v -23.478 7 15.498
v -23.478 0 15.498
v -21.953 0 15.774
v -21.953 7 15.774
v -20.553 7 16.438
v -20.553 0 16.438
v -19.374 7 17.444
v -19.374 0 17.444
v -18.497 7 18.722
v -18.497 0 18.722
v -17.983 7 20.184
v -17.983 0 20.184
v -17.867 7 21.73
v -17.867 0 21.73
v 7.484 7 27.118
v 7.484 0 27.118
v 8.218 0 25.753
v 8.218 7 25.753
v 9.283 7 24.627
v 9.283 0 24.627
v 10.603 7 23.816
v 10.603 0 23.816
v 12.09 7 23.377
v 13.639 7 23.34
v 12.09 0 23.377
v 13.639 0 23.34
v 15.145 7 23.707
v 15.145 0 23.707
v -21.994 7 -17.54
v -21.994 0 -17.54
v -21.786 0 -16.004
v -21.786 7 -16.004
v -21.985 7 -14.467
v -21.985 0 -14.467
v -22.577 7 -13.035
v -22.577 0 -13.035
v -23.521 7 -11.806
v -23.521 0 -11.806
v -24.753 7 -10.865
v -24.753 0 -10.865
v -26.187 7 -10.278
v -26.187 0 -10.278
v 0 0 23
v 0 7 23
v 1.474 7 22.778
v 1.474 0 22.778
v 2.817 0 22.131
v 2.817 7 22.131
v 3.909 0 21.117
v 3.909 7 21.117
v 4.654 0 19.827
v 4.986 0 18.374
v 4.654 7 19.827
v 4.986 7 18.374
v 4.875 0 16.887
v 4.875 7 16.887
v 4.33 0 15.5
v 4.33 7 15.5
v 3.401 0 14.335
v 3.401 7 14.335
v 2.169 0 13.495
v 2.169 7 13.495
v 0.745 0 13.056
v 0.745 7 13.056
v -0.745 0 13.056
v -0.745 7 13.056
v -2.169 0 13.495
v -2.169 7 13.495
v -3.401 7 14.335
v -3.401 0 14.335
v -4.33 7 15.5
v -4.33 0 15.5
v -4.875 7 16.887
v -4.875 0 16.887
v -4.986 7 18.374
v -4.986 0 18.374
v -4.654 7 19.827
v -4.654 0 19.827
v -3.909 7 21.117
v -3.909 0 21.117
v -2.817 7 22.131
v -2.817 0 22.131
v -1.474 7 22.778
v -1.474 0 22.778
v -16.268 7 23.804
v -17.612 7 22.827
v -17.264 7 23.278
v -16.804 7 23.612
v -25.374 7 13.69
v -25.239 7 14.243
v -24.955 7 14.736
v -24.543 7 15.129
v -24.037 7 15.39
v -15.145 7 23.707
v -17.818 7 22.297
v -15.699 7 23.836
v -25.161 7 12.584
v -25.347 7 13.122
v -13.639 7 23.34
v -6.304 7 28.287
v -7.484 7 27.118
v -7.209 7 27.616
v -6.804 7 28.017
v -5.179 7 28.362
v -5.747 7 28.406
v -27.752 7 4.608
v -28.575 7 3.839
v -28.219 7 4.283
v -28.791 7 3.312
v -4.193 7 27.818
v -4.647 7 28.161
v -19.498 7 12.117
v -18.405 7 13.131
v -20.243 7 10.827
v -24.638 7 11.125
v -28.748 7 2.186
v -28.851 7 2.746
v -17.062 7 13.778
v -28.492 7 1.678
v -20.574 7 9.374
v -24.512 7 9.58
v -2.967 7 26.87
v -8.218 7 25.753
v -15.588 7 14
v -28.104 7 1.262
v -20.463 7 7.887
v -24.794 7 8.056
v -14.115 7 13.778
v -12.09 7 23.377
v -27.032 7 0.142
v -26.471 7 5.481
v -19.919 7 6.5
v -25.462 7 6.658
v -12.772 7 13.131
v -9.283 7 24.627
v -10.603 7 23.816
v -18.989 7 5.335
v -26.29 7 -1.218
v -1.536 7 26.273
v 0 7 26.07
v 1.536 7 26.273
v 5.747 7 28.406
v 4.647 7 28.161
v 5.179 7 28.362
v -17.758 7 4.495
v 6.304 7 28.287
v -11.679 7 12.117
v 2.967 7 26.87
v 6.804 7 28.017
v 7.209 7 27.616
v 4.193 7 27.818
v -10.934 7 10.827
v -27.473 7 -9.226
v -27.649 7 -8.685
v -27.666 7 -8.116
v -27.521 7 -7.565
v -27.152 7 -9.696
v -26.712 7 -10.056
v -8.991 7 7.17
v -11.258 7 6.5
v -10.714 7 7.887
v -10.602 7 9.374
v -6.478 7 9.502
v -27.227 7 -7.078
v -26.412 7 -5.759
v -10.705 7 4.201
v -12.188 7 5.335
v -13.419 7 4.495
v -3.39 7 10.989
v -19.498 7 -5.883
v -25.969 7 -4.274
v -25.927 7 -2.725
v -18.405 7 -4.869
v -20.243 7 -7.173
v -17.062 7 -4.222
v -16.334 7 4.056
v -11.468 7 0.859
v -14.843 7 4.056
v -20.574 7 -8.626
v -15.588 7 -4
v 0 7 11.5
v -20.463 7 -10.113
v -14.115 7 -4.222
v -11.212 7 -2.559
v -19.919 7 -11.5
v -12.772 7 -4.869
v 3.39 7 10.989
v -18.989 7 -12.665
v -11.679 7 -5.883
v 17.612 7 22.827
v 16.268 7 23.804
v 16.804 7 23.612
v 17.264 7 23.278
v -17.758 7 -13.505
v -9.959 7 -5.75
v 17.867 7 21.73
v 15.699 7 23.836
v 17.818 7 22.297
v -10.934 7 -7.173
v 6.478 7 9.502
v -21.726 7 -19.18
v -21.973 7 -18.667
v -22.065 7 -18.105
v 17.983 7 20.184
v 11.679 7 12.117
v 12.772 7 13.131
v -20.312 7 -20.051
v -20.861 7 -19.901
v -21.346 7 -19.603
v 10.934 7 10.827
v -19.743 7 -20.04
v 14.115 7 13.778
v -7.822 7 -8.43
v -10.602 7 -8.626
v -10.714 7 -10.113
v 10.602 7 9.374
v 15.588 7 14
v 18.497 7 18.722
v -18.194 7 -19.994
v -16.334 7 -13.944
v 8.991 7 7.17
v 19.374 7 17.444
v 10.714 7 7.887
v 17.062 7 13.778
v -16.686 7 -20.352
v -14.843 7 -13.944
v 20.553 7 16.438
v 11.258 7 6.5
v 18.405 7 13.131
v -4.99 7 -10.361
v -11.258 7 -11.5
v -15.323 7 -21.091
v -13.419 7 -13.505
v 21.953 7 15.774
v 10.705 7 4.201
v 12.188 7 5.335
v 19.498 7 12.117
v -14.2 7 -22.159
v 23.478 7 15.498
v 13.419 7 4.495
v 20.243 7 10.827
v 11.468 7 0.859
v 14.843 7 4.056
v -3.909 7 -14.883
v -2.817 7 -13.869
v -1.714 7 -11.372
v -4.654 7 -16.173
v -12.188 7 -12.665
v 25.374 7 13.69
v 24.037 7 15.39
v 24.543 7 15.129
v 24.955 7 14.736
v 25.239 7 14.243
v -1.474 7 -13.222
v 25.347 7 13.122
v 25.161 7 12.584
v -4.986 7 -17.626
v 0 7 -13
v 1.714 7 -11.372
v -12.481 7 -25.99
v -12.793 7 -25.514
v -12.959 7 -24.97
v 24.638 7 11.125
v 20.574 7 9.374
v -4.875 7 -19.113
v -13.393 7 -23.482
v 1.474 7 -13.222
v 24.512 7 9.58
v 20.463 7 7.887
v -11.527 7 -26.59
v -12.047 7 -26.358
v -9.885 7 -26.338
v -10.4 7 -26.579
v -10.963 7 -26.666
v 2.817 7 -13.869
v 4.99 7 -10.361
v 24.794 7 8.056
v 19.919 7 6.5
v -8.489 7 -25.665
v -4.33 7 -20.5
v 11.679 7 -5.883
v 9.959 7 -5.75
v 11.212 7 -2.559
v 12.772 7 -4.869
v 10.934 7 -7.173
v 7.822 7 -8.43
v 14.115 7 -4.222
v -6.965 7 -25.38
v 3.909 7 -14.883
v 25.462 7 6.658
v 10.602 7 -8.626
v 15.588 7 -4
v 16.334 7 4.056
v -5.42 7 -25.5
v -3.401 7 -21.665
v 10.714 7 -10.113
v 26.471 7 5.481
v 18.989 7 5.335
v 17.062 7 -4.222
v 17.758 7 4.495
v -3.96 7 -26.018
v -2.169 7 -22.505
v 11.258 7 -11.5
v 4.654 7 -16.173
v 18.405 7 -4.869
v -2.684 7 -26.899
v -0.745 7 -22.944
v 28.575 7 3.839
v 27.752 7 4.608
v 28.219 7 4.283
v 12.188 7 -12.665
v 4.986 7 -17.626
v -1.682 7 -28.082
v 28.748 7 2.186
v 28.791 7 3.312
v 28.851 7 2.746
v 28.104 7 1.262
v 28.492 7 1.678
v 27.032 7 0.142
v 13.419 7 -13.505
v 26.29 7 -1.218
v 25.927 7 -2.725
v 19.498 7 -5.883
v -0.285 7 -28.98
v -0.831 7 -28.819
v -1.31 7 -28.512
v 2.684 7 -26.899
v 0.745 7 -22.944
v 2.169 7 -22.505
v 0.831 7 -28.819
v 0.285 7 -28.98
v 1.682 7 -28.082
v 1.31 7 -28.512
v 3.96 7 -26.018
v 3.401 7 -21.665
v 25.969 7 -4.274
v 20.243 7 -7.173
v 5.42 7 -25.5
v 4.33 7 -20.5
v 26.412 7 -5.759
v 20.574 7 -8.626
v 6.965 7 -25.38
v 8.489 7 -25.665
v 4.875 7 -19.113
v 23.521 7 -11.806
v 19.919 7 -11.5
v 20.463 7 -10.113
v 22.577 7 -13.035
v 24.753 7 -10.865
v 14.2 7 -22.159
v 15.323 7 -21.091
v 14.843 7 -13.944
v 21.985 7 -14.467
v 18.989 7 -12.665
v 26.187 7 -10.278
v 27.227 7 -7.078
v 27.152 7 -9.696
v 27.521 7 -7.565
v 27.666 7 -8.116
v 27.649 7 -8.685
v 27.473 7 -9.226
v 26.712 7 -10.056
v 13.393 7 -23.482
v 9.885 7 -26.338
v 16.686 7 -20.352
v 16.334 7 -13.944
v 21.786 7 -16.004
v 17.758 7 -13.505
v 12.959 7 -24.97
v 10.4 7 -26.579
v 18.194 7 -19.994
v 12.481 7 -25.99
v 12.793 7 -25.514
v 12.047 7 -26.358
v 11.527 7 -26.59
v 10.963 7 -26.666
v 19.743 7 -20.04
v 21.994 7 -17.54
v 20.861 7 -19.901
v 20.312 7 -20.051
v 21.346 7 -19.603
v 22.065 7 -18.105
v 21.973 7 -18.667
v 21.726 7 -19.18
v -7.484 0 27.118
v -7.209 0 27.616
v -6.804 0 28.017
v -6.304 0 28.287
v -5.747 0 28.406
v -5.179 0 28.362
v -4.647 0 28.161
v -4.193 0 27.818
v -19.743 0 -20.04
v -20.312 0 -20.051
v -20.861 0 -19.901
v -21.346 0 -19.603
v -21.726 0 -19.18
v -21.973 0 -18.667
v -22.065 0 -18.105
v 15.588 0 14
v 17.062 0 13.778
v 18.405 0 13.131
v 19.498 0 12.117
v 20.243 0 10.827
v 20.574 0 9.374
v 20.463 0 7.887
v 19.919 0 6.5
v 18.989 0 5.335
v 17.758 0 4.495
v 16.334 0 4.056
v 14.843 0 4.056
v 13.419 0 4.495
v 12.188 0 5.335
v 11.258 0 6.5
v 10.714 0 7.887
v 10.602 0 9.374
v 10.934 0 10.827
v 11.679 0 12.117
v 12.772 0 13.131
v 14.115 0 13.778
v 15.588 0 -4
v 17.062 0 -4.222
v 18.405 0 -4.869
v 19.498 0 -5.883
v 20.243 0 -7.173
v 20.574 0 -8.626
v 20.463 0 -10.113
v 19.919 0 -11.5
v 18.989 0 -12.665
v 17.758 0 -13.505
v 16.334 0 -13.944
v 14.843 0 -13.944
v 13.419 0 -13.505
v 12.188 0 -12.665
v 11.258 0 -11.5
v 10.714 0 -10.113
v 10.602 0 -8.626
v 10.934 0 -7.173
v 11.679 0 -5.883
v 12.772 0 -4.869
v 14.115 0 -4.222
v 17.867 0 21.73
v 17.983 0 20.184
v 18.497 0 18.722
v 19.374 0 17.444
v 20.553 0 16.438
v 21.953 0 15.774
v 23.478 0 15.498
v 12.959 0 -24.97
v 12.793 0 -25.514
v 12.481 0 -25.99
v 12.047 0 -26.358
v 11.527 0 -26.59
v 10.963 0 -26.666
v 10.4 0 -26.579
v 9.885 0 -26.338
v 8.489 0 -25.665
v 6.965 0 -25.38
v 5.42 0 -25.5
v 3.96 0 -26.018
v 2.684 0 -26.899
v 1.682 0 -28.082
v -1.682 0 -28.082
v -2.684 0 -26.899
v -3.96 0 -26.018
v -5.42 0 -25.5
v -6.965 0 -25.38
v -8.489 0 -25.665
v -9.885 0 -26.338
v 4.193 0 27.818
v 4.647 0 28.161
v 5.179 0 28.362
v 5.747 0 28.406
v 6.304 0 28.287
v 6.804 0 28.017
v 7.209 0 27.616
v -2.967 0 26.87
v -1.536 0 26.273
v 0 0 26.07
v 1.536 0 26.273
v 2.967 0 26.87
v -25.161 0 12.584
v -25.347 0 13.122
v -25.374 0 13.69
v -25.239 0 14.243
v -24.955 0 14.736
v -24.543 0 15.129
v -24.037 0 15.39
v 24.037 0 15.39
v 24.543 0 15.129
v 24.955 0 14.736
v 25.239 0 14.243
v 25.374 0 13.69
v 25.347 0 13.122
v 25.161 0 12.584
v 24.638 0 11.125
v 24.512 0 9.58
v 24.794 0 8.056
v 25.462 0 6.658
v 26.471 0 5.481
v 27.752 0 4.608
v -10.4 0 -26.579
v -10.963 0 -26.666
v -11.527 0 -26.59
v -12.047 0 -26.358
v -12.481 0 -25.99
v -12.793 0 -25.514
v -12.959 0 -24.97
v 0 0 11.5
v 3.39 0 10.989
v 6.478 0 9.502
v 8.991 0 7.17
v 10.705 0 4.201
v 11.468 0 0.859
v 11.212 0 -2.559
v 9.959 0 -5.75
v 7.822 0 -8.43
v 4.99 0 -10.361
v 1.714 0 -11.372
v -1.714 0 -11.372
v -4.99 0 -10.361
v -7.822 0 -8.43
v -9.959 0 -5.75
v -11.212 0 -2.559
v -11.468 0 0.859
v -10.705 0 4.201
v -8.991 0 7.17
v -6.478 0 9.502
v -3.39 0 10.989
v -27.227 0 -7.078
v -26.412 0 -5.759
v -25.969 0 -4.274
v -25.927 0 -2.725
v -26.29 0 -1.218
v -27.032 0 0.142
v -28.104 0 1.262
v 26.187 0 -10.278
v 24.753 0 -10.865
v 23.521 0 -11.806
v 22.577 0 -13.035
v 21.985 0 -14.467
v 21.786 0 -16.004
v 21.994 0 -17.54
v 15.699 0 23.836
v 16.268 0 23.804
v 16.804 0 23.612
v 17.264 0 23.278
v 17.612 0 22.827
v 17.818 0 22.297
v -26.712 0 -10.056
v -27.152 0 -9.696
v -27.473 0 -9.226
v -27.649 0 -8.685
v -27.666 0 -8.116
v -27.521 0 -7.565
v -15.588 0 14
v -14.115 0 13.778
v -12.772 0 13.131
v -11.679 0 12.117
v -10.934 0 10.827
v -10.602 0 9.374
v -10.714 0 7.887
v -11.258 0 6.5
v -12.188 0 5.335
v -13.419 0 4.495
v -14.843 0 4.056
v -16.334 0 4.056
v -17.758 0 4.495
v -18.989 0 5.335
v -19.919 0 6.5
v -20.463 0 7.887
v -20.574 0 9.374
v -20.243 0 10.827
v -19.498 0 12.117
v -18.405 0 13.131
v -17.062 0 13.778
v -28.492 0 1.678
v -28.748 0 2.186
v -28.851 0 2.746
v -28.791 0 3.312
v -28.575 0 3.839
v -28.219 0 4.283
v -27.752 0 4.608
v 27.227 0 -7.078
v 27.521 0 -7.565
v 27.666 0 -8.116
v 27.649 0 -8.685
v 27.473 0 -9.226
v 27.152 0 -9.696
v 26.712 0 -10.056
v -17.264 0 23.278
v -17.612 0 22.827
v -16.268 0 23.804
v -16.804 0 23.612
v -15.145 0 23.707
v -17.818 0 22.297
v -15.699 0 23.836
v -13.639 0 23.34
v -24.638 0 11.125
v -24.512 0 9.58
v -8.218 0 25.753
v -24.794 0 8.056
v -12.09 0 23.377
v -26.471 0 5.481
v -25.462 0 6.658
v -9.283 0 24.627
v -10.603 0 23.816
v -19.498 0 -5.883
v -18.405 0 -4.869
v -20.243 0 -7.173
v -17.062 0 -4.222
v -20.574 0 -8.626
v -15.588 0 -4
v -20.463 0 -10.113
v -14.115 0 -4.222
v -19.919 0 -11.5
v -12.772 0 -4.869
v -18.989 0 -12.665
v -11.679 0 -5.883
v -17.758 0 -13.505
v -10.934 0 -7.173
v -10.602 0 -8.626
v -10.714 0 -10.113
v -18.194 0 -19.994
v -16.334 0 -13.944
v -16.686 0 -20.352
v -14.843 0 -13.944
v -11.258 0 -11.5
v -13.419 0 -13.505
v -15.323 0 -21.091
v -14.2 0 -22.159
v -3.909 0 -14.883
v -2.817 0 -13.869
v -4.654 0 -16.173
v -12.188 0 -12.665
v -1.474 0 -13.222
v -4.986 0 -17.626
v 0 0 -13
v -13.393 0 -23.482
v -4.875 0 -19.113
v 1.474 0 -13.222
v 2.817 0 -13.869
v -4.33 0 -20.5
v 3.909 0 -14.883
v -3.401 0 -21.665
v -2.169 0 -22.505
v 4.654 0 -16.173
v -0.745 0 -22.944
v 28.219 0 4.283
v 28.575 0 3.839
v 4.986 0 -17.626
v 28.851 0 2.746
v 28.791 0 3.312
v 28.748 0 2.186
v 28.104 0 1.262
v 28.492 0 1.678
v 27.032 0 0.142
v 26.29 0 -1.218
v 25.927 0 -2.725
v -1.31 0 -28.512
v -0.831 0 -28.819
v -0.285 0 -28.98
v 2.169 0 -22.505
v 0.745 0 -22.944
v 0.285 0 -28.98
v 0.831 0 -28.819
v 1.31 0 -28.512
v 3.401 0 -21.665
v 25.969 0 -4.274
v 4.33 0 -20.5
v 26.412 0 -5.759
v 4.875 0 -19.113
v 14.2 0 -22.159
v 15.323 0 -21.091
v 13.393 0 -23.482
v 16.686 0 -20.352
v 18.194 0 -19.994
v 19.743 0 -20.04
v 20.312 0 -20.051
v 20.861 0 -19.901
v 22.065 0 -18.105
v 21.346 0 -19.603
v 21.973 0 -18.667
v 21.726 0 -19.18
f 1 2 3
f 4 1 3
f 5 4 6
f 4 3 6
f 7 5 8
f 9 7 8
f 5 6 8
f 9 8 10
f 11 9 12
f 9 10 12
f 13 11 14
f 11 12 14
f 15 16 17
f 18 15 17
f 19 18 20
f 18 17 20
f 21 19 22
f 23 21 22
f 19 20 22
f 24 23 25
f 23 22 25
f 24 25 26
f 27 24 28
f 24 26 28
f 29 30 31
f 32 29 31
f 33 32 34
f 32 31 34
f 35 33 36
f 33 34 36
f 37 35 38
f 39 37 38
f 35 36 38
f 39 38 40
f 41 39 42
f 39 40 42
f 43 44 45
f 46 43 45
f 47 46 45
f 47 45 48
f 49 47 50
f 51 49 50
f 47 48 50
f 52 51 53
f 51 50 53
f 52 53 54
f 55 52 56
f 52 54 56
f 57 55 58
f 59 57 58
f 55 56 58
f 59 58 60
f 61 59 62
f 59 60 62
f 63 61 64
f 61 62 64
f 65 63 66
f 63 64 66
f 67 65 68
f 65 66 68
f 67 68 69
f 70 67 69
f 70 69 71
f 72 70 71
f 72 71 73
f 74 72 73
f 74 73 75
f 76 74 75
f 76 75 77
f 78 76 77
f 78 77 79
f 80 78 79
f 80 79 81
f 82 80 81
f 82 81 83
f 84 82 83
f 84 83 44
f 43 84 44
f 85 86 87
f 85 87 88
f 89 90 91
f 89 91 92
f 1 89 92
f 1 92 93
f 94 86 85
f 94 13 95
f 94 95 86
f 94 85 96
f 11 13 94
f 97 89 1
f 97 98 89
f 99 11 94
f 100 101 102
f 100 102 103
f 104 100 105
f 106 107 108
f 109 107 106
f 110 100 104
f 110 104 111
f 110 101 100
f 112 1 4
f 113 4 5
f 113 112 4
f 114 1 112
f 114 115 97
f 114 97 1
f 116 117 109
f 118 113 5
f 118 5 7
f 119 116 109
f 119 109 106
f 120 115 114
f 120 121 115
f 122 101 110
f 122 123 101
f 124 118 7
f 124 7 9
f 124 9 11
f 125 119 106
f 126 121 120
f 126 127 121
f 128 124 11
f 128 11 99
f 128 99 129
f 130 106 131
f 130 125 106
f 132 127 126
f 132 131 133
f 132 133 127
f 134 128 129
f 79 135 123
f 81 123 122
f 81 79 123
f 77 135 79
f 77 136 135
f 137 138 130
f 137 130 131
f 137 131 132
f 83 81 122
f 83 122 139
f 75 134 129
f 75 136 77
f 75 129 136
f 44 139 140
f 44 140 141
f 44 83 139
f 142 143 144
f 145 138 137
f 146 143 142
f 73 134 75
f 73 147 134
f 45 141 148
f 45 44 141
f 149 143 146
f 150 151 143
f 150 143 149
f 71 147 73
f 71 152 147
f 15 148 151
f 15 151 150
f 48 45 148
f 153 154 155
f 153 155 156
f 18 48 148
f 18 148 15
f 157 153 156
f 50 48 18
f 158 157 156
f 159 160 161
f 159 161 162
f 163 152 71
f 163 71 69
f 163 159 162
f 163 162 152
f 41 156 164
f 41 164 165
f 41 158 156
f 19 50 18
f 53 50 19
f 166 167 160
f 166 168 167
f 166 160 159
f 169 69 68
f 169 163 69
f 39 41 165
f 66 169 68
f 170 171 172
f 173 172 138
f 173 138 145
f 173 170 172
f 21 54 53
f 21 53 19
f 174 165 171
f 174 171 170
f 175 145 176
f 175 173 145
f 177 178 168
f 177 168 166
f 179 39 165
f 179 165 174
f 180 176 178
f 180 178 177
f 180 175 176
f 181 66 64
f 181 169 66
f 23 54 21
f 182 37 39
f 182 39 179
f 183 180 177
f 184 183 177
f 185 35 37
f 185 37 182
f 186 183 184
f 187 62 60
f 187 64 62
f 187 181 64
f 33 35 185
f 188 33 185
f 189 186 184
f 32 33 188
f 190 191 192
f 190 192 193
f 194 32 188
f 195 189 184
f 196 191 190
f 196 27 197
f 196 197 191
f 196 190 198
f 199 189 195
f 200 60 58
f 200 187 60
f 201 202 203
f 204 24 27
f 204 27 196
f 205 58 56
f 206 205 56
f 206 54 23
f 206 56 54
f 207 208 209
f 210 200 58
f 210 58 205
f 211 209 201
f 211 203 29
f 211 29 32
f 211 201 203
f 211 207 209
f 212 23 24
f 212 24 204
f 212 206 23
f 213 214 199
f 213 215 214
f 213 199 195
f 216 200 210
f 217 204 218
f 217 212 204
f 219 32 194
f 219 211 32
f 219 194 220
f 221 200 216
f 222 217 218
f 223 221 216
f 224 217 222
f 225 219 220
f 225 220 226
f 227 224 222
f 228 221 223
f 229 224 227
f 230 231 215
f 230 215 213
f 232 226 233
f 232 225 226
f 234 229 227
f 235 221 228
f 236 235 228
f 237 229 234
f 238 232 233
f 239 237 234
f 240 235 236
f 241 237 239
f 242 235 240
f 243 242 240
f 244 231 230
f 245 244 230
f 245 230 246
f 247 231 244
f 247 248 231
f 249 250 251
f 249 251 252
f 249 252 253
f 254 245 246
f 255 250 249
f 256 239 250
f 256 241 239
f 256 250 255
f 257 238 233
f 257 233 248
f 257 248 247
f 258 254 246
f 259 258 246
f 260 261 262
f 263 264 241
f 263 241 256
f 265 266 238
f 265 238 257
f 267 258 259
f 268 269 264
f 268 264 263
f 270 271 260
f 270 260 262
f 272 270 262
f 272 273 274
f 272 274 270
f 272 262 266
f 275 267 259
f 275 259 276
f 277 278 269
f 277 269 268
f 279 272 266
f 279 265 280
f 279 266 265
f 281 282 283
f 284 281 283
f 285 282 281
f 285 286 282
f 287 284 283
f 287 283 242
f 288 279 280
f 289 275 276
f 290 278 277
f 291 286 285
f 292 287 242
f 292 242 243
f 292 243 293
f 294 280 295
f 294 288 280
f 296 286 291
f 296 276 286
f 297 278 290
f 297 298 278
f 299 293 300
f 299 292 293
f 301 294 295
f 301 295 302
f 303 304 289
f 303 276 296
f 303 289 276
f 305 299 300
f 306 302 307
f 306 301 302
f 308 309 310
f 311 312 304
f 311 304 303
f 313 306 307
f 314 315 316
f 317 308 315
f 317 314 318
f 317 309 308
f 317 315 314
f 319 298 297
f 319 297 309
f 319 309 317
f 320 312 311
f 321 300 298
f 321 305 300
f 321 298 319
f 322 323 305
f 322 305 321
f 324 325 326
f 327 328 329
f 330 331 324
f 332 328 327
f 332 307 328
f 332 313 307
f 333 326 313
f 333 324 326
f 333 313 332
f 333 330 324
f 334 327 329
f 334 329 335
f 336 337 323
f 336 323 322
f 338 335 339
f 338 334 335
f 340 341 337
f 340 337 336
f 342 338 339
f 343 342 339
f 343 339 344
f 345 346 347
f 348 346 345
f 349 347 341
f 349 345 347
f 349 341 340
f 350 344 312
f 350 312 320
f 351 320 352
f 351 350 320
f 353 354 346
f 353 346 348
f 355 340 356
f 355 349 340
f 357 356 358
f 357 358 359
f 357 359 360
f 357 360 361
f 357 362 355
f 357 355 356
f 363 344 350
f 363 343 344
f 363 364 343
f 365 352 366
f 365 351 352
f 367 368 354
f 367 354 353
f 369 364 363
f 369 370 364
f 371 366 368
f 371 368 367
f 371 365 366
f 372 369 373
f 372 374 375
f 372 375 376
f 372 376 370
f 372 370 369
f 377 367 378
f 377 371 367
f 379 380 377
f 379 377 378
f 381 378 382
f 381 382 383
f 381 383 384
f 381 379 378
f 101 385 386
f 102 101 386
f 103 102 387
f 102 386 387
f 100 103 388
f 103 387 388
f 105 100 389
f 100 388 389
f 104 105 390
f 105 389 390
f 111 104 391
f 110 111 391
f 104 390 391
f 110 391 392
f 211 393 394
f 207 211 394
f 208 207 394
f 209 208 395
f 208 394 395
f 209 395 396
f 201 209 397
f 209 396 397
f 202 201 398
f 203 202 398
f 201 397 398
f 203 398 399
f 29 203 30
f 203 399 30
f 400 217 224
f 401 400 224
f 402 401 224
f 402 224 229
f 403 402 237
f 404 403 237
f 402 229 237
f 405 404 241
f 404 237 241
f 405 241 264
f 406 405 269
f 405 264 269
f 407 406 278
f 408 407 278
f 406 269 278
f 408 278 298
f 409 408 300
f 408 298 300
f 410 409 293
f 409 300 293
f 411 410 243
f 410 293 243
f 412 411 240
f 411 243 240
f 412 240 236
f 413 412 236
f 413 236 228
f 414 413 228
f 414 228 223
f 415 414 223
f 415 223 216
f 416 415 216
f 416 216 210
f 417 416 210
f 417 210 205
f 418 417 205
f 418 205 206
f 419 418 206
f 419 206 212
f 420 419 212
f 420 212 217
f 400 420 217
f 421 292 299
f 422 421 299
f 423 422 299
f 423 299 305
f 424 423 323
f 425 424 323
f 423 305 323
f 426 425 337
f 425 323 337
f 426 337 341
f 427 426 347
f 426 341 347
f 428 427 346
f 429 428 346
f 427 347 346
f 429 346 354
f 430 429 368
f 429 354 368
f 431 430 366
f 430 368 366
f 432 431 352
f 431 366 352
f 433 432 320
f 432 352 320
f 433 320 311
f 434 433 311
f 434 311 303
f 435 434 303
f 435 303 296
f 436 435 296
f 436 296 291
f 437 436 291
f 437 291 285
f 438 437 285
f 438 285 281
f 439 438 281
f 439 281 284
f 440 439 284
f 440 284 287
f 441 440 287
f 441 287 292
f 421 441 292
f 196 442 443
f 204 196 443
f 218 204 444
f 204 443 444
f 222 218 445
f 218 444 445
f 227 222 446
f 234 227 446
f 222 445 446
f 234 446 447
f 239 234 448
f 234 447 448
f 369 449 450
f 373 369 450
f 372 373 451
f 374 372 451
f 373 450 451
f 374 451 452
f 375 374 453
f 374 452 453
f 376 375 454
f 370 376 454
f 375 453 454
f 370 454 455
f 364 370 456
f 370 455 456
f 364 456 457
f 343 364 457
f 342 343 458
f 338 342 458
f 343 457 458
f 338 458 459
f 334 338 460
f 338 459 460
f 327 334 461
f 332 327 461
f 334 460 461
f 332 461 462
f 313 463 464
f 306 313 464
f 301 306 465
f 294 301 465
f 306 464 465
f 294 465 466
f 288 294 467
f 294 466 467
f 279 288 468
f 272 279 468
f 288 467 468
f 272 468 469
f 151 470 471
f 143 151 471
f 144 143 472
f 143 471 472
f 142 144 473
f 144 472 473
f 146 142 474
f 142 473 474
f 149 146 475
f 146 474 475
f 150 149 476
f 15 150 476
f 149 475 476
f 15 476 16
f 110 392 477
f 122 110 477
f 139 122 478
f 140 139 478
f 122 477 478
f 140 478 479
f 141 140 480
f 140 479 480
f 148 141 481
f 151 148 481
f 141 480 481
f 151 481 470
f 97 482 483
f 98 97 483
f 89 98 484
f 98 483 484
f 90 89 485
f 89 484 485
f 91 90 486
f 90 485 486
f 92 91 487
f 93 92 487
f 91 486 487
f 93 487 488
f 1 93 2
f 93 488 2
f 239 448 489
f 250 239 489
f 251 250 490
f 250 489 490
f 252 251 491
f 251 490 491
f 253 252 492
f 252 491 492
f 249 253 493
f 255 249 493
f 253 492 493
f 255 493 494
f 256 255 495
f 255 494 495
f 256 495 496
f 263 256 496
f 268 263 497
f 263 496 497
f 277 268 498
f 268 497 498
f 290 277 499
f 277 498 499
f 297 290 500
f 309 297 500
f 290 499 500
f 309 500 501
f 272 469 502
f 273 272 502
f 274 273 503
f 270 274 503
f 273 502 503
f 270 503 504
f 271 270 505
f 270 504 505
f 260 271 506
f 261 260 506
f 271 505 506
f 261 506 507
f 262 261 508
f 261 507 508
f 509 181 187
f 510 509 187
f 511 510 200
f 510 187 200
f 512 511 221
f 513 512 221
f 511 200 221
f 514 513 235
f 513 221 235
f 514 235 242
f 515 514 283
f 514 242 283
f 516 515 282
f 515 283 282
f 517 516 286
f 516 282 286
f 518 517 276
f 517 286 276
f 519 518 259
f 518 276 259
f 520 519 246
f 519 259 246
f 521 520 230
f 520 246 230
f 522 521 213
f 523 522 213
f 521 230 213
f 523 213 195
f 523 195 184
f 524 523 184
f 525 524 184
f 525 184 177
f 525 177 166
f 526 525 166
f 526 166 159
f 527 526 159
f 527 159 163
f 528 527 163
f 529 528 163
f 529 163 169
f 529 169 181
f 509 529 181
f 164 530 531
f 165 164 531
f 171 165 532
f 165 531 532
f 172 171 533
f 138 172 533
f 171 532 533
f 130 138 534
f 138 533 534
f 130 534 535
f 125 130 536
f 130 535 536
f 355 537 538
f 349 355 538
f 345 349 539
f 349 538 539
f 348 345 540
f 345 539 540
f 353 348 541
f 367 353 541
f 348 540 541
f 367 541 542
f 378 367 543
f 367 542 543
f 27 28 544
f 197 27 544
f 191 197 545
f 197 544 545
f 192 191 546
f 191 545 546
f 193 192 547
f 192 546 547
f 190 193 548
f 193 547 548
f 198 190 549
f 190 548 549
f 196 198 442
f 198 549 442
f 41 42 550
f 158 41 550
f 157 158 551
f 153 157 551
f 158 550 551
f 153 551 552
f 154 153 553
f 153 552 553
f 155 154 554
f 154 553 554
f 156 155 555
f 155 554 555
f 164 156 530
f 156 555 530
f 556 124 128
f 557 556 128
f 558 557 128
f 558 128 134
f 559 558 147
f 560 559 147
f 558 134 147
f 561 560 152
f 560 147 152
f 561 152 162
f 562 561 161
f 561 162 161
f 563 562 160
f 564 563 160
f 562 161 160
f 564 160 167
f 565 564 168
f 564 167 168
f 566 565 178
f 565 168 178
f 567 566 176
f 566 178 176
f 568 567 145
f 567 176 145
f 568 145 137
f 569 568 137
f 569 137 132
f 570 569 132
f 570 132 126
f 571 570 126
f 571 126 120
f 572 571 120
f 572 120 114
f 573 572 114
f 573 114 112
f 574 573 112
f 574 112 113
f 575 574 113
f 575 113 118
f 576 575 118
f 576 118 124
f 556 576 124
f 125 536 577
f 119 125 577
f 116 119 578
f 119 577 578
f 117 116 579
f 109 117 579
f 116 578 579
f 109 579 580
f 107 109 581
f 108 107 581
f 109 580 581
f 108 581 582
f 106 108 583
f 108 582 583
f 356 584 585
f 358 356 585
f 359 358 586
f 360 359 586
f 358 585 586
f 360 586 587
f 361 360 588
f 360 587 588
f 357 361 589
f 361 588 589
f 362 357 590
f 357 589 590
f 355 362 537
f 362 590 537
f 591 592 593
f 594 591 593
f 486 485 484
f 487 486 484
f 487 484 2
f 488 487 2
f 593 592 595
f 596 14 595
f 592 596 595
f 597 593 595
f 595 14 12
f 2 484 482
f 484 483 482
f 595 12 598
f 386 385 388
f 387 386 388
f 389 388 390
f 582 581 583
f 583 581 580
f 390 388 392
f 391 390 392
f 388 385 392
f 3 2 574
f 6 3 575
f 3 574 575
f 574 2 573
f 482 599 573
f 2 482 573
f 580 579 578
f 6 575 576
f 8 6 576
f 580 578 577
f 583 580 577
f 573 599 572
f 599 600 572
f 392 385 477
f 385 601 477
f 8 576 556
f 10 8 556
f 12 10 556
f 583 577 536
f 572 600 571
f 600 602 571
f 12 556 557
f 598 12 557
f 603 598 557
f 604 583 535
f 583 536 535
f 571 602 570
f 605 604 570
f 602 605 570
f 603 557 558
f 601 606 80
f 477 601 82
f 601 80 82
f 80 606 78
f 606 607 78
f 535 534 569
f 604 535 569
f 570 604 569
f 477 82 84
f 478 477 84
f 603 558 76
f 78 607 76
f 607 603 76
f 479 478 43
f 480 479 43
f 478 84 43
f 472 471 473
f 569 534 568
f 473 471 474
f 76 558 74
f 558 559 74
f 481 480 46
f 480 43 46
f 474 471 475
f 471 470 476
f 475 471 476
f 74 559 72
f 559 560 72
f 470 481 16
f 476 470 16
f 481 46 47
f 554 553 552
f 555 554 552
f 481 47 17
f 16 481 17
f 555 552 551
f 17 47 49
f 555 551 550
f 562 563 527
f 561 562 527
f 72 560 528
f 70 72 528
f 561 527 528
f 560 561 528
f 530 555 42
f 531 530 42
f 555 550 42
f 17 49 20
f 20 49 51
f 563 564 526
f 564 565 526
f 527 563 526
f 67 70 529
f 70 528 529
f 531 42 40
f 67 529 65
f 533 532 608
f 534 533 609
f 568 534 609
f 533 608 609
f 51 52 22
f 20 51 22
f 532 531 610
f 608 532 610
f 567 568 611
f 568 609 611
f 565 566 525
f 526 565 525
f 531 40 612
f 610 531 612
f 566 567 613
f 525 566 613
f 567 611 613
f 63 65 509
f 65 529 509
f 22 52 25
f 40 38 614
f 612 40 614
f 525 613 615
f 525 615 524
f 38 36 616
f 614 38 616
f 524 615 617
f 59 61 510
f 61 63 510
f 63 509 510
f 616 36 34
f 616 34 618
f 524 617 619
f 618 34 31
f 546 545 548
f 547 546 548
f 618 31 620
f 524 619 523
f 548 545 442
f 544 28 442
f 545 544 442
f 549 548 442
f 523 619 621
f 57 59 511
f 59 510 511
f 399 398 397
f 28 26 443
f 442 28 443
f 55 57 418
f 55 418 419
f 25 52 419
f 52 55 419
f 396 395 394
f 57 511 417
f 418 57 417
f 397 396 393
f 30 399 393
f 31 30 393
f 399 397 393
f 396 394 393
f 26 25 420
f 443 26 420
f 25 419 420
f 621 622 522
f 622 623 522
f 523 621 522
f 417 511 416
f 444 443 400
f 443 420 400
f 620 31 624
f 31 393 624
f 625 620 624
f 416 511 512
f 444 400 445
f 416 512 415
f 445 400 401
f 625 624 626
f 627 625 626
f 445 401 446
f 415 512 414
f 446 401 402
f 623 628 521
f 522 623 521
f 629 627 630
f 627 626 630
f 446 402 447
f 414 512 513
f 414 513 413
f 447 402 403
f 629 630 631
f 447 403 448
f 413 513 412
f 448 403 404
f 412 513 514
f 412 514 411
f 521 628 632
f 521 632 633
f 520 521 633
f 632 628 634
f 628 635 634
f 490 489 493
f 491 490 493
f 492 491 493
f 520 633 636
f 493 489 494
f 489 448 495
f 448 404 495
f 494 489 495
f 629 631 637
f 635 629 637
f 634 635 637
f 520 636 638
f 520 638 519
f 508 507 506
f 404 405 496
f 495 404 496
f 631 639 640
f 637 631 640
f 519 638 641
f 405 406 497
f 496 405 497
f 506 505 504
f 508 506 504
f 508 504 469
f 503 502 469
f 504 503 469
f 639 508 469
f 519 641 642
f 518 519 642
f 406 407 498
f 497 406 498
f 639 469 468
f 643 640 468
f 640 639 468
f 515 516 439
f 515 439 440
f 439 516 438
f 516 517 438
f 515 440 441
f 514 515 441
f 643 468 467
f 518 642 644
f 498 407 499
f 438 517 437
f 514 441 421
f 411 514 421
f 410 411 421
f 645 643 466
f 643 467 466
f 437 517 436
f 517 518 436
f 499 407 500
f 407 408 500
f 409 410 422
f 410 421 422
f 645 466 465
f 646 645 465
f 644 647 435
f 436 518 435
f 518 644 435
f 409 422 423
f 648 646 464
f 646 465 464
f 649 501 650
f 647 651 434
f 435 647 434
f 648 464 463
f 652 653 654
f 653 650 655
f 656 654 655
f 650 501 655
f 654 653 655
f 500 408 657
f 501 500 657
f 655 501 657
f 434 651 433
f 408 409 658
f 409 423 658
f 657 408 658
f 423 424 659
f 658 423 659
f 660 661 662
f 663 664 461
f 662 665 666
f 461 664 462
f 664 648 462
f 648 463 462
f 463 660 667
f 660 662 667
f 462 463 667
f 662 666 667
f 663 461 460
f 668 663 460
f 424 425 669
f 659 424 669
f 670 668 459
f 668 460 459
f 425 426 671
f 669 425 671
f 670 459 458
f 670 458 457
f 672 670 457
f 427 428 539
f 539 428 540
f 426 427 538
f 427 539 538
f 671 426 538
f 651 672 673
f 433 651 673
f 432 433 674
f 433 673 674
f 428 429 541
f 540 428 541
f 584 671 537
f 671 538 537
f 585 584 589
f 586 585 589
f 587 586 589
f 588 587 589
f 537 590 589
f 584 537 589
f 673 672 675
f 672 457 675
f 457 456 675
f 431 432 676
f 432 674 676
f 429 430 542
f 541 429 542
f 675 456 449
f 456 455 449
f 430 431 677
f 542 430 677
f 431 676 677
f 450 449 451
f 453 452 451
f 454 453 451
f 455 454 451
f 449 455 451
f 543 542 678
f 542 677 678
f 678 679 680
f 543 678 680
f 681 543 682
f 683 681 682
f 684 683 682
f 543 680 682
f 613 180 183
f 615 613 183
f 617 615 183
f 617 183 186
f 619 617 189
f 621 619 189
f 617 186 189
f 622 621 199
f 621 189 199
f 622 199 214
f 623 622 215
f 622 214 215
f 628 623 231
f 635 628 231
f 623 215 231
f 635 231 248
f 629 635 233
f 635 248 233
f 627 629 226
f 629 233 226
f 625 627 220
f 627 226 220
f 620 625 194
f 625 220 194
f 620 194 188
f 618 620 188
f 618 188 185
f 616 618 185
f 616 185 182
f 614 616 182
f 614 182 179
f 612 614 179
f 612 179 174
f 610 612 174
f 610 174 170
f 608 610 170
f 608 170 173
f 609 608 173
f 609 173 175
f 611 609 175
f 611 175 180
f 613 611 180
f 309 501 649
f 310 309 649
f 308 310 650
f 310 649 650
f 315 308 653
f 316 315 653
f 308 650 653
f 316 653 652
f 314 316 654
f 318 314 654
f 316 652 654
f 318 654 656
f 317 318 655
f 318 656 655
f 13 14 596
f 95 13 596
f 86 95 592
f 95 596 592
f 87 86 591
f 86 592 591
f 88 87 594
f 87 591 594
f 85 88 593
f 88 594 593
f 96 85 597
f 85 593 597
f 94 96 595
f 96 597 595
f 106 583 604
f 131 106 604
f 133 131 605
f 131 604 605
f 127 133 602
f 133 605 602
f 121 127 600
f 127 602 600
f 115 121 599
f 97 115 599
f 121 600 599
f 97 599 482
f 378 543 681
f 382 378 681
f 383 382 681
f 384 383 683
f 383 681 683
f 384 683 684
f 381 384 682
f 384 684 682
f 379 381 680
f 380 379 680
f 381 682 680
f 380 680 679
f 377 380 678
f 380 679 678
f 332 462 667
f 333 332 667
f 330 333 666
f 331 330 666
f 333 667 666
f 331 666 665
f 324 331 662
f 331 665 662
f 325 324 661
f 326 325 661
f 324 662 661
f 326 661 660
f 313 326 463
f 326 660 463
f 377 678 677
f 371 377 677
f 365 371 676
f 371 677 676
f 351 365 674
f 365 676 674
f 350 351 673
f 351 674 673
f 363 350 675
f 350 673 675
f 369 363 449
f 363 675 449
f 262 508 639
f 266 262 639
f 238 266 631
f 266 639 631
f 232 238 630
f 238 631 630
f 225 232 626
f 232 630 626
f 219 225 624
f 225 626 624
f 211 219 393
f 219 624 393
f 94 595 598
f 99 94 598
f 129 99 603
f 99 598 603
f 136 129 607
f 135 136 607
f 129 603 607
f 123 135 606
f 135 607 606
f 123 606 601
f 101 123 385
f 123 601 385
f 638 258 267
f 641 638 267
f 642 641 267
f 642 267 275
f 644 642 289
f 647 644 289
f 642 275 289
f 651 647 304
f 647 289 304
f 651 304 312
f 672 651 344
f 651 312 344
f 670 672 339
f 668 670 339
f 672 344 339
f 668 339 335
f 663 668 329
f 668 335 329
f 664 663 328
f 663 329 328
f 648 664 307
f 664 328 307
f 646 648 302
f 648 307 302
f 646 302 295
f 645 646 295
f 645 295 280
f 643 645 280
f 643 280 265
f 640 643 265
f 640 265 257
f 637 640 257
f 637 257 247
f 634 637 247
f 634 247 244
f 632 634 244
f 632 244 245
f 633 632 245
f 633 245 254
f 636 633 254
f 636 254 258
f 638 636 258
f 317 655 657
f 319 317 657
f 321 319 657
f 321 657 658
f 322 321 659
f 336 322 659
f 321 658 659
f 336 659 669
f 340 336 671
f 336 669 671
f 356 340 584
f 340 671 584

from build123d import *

# Parameters (mm, degrees)
BOSS_EXTRUDE1_DEPTH = 7
SKETCH2_R           = 5
SKETCH2_R_2         = 11.5
CUT_EXTRUDE1_DEPTH  = 42.502327226


with BuildPart() as part:
    # Sketch1 → Boss-Extrude1 (new body)
    with BuildSketch(Plane(origin=(0, 0, 0), x_dir=(1, 0, 0), z_dir=(0, 1, 0))):
        with BuildLine():
            ThreePointArc((1.682317925, 28.081575887), (0, 29), (-1.682317925, 28.081575887))
            ThreePointArc((-1.682317925, 28.081575887), (-5.420186592, 25.49997304), (-9.884932009, 26.33805644))
            ThreePointArc((-9.884932009, 26.33805644), (-11.795362649, 26.492818272), (-12.958679807, 24.969535749))
            ThreePointArc((-12.958679807, 24.969535749), (-15.323360273, 21.090796041), (-19.742987398, 20.040447761))
            ThreePointArc((-19.742987398, 20.040447761), (-21.551199939, 19.404787584), (-21.994368225, 17.540036039))
            ThreePointArc((-21.994368225, 17.540036039), (-22.576985755, 13.034828803), (-26.187300906, 10.277663603))
            ThreePointArc((-26.187300906, 10.277663603), (-27.580638973, 8.961492837), (-27.227030564, 7.077704752))
            ThreePointArc((-27.227030564, 7.077704752), (-25.926845294, 2.725021248), (-28.103592183, -1.262221962))
            ThreePointArc((-28.103592183, -1.262221962), (-28.841134966, -3.031325435), (-27.751891968, -4.608425985))
            ThreePointArc((-27.751891968, -4.608425985), (-24.793717744, -8.055967238), (-25.160517059, -12.583857883))
            ThreePointArc((-25.160517059, -12.583857883), (-25.11473671, -14.5), (-23.478199133, -15.497718004))
            ThreePointArc((-23.478199133, -15.497718004), (-19.373531152, -17.444005802), (-17.866959959, -21.729630455))
            ThreePointArc((-17.866959959, -21.729630455), (-17.045772316, -23.461492837), (-15.144912376, -23.707313787))
            ThreePointArc((-15.144912376, -23.707313787), (-10.603485021, -23.815817289), (-7.484043166, -27.118152514))
            ThreePointArc((-7.484043166, -27.118152514), (-6.029439034, -28.366280421), (-4.192932681, -27.817699643))
            ThreePointArc((-4.192932681, -27.817699643), (0, -26.069657606), (4.192932681, -27.817699643))
            ThreePointArc((4.192932681, -27.817699643), (6.029439034, -28.366280421), (7.484043166, -27.118152514))
            ThreePointArc((7.484043166, -27.118152514), (10.603485021, -23.815817289), (15.144912376, -23.707313787))
            ThreePointArc((15.144912376, -23.707313787), (17.045772316, -23.461492837), (17.866959959, -21.729630455))
            ThreePointArc((17.866959959, -21.729630455), (19.373531152, -17.444005802), (23.478199133, -15.497718004))
            ThreePointArc((23.478199133, -15.497718004), (25.11473671, -14.5), (25.160517059, -12.583857883))
            ThreePointArc((25.160517059, -12.583857883), (24.793717744, -8.055967238), (27.751891968, -4.608425985))
            ThreePointArc((27.751891968, -4.608425985), (28.841134966, -3.031325435), (28.103592183, -1.262221962))
            ThreePointArc((28.103592183, -1.262221962), (25.926845294, 2.725021248), (27.227030564, 7.077704752))
            ThreePointArc((27.227030564, 7.077704752), (27.580638973, 8.961492837), (26.187300906, 10.277663603))
            ThreePointArc((26.187300906, 10.277663603), (22.576985755, 13.034828803), (21.994368225, 17.540036039))
            ThreePointArc((21.994368225, 17.540036039), (21.551199939, 19.404787584), (19.742987398, 20.040447761))
            ThreePointArc((19.742987398, 20.040447761), (15.323360273, 21.090796041), (12.958679807, 24.969535749))
            ThreePointArc((12.958679807, 24.969535749), (11.795362649, 26.492818272), (9.884932009, 26.33805644))
            ThreePointArc((9.884932009, 26.33805644), (5.420186592, 25.49997304), (1.682317925, 28.081575887))
        make_face()
    extrude(amount=BOSS_EXTRUDE1_DEPTH)

    # Sketch2 → Cut-Extrude1 (cut, through all)
    with BuildSketch(Plane(origin=(0, 7, 0), x_dir=(1, 0, 0), z_dir=(0, 1, 0))):
        with Locations(Location((0, 18, 0), (0, 0, 270))):
            Circle(SKETCH2_R)
        with Locations(Location((0, 0, 0), (0, 0, 270))):
            Circle(SKETCH2_R_2)
        with Locations(Location((-15.588457268, -9, 0), (0, 0, 270))):
            Circle(SKETCH2_R)
        with Locations(Location((0, -18, 0), (0, 0, 270))):
            Circle(SKETCH2_R)
        with Locations(Location((15.588457268, -9, 0), (0, 0, 270))):
            Circle(SKETCH2_R)
        with Locations(Location((15.588457268, 9, 0), (0, 0, 270))):
            Circle(SKETCH2_R)
        with Locations(Location((-15.588457268, 9, 0), (0, 0, 270))):
            Circle(SKETCH2_R)
    extrude(amount=-CUT_EXTRUDE1_DEPTH, mode=Mode.SUBTRACT)


solid = part.part
